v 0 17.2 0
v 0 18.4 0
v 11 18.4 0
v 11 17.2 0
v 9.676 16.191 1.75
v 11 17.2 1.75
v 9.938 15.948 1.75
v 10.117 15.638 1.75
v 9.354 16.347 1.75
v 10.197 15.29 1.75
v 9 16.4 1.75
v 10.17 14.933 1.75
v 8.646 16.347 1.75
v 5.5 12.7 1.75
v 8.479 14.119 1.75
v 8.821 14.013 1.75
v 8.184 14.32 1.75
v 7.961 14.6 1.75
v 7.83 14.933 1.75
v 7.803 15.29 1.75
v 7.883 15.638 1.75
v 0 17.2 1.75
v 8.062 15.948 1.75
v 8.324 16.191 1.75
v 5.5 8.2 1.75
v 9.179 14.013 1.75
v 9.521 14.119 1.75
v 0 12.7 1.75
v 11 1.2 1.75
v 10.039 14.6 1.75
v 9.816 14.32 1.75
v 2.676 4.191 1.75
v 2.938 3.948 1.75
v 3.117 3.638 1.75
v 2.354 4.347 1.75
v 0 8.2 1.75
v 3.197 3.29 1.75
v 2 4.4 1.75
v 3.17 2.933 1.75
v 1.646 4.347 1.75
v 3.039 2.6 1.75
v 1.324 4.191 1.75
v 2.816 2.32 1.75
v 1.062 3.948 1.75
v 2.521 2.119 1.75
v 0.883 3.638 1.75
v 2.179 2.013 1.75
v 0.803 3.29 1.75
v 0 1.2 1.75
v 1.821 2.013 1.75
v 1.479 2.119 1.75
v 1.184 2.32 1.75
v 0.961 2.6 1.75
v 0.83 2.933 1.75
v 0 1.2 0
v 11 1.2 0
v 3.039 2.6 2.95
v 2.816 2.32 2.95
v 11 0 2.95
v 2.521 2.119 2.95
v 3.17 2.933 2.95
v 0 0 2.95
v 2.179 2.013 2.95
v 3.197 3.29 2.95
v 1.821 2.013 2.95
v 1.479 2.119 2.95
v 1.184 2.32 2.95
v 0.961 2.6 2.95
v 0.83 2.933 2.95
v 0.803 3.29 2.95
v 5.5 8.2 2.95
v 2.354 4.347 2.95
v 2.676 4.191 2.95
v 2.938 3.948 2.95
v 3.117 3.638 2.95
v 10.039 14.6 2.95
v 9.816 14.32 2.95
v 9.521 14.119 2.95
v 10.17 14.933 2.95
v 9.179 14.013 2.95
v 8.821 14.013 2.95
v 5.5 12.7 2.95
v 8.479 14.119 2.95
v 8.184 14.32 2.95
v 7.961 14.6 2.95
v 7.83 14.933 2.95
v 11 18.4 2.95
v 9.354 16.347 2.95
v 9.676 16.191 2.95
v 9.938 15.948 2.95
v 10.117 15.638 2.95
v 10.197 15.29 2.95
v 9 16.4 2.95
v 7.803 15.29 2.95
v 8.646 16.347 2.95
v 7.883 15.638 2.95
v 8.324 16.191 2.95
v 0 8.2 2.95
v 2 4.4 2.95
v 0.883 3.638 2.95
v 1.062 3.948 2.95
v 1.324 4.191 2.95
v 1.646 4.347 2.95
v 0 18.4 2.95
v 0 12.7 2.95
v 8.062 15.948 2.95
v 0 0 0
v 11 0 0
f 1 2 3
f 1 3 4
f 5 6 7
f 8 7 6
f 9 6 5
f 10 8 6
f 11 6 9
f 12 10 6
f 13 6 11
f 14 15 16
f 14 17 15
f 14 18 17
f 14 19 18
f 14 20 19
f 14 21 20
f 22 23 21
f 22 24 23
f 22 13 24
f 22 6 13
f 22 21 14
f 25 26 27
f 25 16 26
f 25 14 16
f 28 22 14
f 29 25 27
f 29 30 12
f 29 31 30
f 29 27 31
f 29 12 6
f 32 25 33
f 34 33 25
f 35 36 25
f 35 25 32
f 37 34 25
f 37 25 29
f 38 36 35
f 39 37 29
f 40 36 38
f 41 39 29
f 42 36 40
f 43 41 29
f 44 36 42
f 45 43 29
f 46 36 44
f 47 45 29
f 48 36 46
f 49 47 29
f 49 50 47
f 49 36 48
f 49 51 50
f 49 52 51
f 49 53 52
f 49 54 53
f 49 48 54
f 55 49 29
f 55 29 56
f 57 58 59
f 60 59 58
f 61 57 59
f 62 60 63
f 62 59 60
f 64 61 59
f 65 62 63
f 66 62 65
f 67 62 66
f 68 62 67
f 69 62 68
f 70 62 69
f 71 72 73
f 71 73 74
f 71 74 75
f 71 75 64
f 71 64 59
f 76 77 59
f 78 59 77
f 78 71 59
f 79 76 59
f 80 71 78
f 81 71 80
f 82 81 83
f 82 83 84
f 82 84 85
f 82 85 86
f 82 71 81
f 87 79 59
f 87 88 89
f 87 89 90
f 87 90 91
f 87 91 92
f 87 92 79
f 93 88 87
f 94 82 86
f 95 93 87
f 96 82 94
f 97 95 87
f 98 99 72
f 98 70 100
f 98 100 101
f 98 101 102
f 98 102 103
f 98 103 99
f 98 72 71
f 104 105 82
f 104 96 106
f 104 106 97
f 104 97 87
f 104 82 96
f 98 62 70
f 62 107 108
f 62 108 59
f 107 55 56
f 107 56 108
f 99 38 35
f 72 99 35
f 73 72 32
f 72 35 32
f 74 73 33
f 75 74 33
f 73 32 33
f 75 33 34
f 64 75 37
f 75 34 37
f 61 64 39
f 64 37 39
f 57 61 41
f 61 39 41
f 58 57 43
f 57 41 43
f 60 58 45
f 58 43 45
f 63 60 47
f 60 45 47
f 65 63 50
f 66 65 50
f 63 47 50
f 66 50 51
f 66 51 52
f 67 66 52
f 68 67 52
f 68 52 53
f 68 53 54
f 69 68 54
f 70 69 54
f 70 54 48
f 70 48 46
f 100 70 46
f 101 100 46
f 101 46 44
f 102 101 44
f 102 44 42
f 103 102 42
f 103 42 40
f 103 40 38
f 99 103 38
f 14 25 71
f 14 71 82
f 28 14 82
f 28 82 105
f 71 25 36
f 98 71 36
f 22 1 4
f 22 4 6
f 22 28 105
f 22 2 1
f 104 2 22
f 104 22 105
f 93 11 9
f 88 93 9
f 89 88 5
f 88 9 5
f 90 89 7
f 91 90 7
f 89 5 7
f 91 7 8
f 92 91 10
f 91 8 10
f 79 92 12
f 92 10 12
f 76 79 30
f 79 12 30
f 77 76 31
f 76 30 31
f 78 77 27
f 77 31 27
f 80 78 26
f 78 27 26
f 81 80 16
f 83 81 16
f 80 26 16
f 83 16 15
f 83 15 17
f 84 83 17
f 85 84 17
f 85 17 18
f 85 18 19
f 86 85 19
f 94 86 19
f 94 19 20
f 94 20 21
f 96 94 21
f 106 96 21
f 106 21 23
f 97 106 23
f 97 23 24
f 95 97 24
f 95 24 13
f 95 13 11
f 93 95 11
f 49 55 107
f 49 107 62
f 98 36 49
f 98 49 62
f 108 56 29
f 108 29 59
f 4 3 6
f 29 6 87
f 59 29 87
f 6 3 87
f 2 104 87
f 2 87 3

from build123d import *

# Parameters (mm, degrees)
BOSS_EXTRUDE1_DEPTH = 11
SKETCH3_R           = 1.2
SKETCH3_W           = 5.5
SKETCH3_H           = 4.5
CUT_EXTRUDE1_DEPTH  = 22.508661046


with BuildPart() as part:
    # Sketch1 → Boss-Extrude1 (new body)
    with BuildSketch(Plane(origin=(0, 0, 0), x_dir=(0, 0, -1), z_dir=(1, 0, 0))):
        Polygon((0, 0), (-2.95, 0), (-2.95, 18.4), (0, 18.4), (0, 17.2), (-1.75, 17.2), (-1.75, 1.2), (0, 1.2), align=None)
    extrude(amount=BOSS_EXTRUDE1_DEPTH)

    # Sketch3 → Cut-Extrude1 (cut, through all)
    with BuildSketch(Plane(origin=(0, 0, 1.75), x_dir=(-1, 0, 0), z_dir=(0, 0, -1))):
        with Locations(Location((-9, 15.2, 0), (0, 0, 90))):
            Circle(SKETCH3_R)
        with Locations(Location((-2, 3.2, 0), (0, 0, 90))):
            Circle(SKETCH3_R)
        with Locations((-2.75, 10.45)):
            Rectangle(SKETCH3_W, SKETCH3_H)
    extrude(amount=-CUT_EXTRUDE1_DEPTH, mode=Mode.SUBTRACT)


solid = part.part
